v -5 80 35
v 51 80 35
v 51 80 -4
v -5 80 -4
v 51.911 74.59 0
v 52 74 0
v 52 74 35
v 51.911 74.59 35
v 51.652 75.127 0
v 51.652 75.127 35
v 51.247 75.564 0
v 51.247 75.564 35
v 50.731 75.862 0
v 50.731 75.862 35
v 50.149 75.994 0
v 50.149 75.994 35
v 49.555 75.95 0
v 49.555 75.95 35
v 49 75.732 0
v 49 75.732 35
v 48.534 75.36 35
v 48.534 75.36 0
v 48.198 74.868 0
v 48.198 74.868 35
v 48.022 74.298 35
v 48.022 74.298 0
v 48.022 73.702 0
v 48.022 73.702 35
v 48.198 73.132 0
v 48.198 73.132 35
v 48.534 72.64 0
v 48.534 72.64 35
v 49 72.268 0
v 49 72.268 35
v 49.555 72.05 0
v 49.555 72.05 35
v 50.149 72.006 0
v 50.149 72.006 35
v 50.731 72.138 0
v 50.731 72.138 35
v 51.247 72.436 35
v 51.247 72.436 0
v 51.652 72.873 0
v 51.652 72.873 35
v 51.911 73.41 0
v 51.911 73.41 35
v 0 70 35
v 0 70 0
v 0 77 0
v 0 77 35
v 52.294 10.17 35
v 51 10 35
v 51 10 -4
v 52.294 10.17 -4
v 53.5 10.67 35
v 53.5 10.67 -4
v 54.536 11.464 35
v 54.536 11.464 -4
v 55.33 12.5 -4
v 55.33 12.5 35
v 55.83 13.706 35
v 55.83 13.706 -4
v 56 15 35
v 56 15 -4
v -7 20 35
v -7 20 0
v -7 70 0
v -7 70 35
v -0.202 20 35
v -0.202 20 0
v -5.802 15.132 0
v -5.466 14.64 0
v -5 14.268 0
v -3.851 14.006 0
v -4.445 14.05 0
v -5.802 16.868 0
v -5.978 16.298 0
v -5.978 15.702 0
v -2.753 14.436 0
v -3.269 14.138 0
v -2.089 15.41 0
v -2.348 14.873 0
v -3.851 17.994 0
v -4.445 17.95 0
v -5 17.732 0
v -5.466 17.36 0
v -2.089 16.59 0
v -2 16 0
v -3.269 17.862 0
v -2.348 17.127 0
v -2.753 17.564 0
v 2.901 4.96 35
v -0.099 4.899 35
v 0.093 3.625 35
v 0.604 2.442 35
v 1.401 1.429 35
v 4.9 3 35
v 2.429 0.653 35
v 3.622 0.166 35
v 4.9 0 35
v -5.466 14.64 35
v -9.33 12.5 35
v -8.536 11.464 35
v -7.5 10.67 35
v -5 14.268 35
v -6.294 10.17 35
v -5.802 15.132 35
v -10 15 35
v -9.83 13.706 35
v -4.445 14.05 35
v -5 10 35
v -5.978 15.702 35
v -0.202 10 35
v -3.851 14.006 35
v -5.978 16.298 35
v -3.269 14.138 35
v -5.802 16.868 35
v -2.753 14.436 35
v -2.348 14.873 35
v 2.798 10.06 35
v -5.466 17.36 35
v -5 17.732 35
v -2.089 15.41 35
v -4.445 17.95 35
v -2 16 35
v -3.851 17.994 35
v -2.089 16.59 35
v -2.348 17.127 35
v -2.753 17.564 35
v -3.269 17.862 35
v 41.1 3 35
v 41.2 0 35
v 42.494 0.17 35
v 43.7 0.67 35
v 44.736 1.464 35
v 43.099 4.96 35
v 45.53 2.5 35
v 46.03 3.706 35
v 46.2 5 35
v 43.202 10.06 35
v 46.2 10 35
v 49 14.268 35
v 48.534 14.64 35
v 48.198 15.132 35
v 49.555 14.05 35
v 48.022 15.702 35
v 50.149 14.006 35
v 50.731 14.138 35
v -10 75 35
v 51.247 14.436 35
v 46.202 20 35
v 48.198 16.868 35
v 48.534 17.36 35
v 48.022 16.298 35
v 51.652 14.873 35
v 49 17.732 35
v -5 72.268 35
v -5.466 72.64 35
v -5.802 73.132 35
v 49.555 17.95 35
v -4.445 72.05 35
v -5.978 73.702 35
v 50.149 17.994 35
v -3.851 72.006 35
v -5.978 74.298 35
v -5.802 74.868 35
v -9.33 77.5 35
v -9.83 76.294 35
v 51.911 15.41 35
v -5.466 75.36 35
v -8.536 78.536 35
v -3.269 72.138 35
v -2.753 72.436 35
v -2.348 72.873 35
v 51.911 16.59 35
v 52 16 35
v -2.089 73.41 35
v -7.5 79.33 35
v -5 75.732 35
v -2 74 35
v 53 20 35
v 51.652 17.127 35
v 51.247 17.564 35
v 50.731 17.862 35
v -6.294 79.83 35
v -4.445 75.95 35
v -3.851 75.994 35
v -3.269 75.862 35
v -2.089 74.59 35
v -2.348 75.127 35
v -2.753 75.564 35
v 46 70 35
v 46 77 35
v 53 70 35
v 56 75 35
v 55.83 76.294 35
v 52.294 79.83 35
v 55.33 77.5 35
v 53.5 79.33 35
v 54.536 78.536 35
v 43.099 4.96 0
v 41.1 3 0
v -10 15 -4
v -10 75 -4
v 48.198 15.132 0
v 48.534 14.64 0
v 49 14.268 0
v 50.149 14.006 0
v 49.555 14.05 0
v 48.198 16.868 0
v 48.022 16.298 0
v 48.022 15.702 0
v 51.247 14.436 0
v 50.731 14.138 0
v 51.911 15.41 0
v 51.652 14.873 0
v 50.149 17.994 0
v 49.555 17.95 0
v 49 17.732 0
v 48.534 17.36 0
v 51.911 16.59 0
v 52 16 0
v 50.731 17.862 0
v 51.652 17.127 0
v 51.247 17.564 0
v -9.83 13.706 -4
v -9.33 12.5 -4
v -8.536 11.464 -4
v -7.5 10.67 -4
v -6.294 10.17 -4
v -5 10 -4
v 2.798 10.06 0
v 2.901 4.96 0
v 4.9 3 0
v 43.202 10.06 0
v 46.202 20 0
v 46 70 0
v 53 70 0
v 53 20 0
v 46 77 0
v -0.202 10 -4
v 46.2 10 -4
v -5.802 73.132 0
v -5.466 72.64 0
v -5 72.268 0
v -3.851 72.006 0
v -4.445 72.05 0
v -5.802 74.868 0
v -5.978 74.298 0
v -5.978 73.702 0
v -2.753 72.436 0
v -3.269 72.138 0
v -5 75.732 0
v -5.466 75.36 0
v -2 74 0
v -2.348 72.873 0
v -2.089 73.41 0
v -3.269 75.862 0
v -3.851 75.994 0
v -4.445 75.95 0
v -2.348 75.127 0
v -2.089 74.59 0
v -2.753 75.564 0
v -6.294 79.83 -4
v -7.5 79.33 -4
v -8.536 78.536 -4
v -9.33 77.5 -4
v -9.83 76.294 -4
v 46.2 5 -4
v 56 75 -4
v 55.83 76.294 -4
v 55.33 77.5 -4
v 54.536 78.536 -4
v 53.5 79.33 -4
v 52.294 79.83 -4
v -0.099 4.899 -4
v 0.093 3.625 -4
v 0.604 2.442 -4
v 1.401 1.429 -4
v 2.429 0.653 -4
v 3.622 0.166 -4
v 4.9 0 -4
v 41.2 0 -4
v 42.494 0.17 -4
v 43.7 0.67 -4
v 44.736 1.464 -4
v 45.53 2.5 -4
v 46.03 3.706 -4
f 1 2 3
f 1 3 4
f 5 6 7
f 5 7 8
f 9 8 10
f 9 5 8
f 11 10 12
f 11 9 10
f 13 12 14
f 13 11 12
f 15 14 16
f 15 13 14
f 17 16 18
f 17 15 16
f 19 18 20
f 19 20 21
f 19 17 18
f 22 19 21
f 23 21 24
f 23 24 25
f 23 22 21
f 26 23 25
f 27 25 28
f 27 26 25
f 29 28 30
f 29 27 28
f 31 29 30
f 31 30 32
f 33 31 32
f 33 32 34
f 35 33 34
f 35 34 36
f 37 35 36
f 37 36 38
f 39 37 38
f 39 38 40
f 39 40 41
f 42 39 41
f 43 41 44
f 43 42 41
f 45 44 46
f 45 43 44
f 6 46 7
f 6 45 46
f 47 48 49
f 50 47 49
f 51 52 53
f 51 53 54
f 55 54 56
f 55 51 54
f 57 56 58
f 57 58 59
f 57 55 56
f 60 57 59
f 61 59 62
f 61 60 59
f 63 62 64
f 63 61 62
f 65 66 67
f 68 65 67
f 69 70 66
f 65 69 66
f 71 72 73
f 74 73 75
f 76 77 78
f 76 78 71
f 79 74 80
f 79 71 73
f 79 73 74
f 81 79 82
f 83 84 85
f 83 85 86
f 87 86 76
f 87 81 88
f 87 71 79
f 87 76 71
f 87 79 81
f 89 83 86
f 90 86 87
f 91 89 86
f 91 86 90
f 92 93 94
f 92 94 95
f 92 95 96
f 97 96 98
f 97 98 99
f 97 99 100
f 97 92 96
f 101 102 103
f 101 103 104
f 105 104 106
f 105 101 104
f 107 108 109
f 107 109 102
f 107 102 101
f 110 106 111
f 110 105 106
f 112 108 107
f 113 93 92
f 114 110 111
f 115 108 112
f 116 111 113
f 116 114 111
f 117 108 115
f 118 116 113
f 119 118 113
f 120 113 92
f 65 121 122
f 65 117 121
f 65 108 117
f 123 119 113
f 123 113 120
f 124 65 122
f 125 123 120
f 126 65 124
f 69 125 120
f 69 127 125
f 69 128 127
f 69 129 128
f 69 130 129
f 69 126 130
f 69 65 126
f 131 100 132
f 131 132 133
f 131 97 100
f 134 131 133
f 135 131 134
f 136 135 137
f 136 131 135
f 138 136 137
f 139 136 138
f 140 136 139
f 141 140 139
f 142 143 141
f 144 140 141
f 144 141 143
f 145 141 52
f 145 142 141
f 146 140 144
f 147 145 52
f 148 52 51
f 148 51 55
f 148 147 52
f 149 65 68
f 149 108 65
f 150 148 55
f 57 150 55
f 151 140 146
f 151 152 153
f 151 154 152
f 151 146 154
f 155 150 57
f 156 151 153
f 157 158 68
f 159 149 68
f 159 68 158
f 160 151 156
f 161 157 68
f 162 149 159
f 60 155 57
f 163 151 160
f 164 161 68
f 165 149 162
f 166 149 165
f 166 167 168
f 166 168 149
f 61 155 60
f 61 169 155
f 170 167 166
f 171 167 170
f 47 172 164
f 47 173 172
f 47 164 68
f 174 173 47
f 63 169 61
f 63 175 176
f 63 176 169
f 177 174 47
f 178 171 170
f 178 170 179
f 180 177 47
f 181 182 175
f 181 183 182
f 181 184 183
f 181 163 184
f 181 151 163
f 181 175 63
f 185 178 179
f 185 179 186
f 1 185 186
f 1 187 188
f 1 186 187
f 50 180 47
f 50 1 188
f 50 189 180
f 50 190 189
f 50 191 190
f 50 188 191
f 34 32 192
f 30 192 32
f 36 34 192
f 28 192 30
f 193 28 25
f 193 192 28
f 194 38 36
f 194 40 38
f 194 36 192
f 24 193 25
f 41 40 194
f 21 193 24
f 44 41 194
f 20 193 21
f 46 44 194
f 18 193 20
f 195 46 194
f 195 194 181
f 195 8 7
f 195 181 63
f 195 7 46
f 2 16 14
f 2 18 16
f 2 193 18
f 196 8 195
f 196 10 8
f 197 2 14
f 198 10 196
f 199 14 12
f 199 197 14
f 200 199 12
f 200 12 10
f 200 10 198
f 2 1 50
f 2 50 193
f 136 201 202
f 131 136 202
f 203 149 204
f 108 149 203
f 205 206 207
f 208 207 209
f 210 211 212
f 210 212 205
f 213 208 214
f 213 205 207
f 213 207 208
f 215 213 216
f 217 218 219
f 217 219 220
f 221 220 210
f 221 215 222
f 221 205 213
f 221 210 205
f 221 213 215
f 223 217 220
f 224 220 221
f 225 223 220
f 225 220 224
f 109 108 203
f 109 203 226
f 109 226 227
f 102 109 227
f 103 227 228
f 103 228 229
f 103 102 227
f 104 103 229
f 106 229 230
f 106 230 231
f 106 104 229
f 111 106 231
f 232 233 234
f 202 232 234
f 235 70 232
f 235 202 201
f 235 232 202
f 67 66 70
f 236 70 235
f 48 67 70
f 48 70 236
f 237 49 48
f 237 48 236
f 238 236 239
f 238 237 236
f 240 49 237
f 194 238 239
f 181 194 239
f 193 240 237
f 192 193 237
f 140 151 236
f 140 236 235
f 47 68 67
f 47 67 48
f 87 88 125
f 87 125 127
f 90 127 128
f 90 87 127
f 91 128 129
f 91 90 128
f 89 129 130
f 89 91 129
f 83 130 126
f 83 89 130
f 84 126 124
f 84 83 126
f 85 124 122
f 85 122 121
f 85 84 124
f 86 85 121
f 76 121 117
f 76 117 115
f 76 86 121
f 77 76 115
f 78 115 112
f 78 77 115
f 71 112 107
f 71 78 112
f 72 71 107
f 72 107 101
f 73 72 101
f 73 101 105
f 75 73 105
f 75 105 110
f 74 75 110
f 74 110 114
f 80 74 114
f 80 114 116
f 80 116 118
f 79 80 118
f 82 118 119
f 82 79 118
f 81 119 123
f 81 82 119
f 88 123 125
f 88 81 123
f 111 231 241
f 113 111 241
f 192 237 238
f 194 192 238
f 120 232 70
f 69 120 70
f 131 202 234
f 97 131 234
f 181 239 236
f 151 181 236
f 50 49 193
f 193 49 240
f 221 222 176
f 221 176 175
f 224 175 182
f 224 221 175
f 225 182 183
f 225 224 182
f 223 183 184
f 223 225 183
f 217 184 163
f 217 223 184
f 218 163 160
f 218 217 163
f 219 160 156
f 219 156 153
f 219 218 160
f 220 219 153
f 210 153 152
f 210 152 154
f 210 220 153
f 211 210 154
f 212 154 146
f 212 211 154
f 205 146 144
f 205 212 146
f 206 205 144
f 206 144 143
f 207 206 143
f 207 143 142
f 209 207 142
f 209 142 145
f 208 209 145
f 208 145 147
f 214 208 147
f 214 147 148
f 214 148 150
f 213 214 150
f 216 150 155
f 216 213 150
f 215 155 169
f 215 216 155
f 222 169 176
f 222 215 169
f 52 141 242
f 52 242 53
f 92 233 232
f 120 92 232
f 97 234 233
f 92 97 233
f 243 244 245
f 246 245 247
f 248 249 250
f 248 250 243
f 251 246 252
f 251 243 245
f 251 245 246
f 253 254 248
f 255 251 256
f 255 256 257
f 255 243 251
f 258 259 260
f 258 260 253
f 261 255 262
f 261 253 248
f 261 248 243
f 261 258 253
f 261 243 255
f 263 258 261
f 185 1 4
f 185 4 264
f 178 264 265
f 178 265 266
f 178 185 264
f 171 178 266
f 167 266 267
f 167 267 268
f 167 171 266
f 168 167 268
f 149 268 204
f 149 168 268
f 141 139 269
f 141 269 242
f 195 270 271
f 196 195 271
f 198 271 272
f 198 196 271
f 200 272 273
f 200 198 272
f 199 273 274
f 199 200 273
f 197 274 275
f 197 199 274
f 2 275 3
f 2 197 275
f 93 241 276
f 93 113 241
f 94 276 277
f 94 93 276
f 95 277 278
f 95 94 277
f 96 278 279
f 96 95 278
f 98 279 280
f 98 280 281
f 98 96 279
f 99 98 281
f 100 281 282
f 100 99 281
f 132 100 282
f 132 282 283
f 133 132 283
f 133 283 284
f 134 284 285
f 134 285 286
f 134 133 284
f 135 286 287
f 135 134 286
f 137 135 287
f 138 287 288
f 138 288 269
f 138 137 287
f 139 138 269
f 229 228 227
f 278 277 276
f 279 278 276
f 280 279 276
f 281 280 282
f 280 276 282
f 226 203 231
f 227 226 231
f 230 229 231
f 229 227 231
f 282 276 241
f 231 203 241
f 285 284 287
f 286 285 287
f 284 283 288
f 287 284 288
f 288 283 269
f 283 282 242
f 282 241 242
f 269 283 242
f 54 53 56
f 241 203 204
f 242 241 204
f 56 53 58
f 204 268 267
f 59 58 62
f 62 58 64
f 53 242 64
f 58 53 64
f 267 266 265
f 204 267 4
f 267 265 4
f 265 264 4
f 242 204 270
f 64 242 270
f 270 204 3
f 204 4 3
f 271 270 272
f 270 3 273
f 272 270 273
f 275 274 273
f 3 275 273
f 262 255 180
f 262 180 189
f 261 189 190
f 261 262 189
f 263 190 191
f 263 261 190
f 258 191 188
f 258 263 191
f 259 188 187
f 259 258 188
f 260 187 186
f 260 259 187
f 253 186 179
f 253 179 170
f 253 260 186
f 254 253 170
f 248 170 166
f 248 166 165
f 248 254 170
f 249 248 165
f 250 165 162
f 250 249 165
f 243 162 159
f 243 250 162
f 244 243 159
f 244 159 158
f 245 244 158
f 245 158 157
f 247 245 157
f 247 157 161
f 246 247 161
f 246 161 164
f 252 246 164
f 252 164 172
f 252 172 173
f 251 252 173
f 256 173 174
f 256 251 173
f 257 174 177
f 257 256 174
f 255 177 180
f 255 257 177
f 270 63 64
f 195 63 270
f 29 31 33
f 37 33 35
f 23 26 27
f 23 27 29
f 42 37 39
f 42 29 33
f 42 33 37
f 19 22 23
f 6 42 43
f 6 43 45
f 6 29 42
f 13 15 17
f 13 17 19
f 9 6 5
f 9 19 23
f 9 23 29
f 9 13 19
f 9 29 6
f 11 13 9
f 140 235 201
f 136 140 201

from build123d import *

# Parameters (mm, degrees)
F0_R     = 2
F1_DEPTH = 35
F2_DEPTH = 4


with BuildPart() as f1:
    # F0 (on Top) → F1 (new body)
    with BuildSketch(Plane.XY):
        with BuildLine():
            ThreePointArc((-0.098751, 4.899238), (1.400506, 1.429019), (4.900234, 0))
            Line((4.900234, 0), (41.2, 0))
            ThreePointArc((41.2, 0), (44.735534, 1.464466), (46.2, 5))
            Line((46.2, 5), (46.2, 10))
            Line((46.2, 10), (51, 10))
            ThreePointArc((51, 10), (54.535534, 11.464466), (56, 15))
            Line((56, 15), (56, 30))
            Line((56, 30), (56, 75))
            ThreePointArc((56, 75), (54.535534, 78.535534), (51, 80))
            Line((51, 80), (-5, 80))
            ThreePointArc((-5, 80), (-8.535534, 78.535534), (-10, 75))
            Line((-10, 75), (-10, 30))
            Line((-10, 30), (-10, 15))
            ThreePointArc((-10, 15), (-8.535534, 11.464466), (-5, 10))
            Line((-5, 10), (-0.201564, 10))
            Line((-0.201564, 10), (-0.098751, 4.899238))
        make_face()
        with Locations((-4, 16)):
            Circle(F0_R, mode=Mode.SUBTRACT)
        with Locations((50, 16)):
            Circle(F0_R, mode=Mode.SUBTRACT)
        with Locations((-4, 74)):
            Circle(F0_R, mode=Mode.SUBTRACT)
        Polygon((-7, 30), (-7, 70), (0, 70), (0, 77), (23, 77), (46, 77), (46, 70), (53, 70), (53, 30), (53, 20), (46.201564, 20), (43.202173, 10.060457), (43.09936, 4.959695), (41.099766, 3), (23.1, 3), (22.9, 3), (4.900234, 3), (2.90064, 4.959695), (2.797827, 10.060457), (-0.201564, 20), (-7, 20), align=None, mode=Mode.SUBTRACT)
        with Locations((50, 74)):
            Circle(F0_R, mode=Mode.SUBTRACT)
    extrude(amount=F1_DEPTH)

    # F0 (on Top) → F2 (join)
    with BuildSketch(Plane.XY):
        with BuildLine():
            ThreePointArc((-0.098751, 4.899238), (1.400506, 1.429019), (4.900234, 0))
            Line((4.900234, 0), (41.2, 0))
            ThreePointArc((41.2, 0), (44.735534, 1.464466), (46.2, 5))
            Line((46.2, 5), (46.2, 10))
            Line((46.2, 10), (51, 10))
            ThreePointArc((51, 10), (54.535534, 11.464466), (56, 15))
            Line((56, 15), (56, 30))
            Line((56, 30), (56, 75))
            ThreePointArc((56, 75), (54.535534, 78.535534), (51, 80))
            Line((51, 80), (-5, 80))
            ThreePointArc((-5, 80), (-8.535534, 78.535534), (-10, 75))
            Line((-10, 75), (-10, 30))
            Line((-10, 30), (-10, 15))
            ThreePointArc((-10, 15), (-8.535534, 11.464466), (-5, 10))
            Line((-5, 10), (-0.201564, 10))
            Line((-0.201564, 10), (-0.098751, 4.899238))
        make_face()
        with Locations((-4, 16)):
            Circle(F0_R, mode=Mode.SUBTRACT)
        with Locations((50, 16)):
            Circle(F0_R, mode=Mode.SUBTRACT)
        with Locations((-4, 74)):
            Circle(F0_R, mode=Mode.SUBTRACT)
        Polygon((-7, 30), (-7, 70), (0, 70), (0, 77), (23, 77), (46, 77), (46, 70), (53, 70), (53, 30), (53, 20), (46.201564, 20), (43.202173, 10.060457), (43.09936, 4.959695), (41.099766, 3), (23.1, 3), (22.9, 3), (4.900234, 3), (2.90064, 4.959695), (2.797827, 10.060457), (-0.201564, 20), (-7, 20), align=None, mode=Mode.SUBTRACT)
        with Locations((50, 74)):
            Circle(F0_R, mode=Mode.SUBTRACT)
        Polygon((0, 70), (-7, 70), (-7, 30), (-7, 20), (-0.201564, 20), (2.797827, 10.060457), (2.90064, 4.959695), (4.900234, 3), (22.9, 3), (23.1, 3), (41.099766, 3), (43.09936, 4.959695), (43.202173, 10.060457), (46.201564, 20), (53, 20), (53, 30), (53, 70), (46, 70), (46, 77), (23, 77), (0, 77), align=None)
        with Locations((50, 74)):
            Circle(F0_R)
        with Locations((-4, 74)):
            Circle(F0_R)
        with Locations((-4, 16)):
            Circle(F0_R)
        with Locations((50, 16)):
            Circle(F0_R)
    extrude(amount=-F2_DEPTH)


solid = f1.part
